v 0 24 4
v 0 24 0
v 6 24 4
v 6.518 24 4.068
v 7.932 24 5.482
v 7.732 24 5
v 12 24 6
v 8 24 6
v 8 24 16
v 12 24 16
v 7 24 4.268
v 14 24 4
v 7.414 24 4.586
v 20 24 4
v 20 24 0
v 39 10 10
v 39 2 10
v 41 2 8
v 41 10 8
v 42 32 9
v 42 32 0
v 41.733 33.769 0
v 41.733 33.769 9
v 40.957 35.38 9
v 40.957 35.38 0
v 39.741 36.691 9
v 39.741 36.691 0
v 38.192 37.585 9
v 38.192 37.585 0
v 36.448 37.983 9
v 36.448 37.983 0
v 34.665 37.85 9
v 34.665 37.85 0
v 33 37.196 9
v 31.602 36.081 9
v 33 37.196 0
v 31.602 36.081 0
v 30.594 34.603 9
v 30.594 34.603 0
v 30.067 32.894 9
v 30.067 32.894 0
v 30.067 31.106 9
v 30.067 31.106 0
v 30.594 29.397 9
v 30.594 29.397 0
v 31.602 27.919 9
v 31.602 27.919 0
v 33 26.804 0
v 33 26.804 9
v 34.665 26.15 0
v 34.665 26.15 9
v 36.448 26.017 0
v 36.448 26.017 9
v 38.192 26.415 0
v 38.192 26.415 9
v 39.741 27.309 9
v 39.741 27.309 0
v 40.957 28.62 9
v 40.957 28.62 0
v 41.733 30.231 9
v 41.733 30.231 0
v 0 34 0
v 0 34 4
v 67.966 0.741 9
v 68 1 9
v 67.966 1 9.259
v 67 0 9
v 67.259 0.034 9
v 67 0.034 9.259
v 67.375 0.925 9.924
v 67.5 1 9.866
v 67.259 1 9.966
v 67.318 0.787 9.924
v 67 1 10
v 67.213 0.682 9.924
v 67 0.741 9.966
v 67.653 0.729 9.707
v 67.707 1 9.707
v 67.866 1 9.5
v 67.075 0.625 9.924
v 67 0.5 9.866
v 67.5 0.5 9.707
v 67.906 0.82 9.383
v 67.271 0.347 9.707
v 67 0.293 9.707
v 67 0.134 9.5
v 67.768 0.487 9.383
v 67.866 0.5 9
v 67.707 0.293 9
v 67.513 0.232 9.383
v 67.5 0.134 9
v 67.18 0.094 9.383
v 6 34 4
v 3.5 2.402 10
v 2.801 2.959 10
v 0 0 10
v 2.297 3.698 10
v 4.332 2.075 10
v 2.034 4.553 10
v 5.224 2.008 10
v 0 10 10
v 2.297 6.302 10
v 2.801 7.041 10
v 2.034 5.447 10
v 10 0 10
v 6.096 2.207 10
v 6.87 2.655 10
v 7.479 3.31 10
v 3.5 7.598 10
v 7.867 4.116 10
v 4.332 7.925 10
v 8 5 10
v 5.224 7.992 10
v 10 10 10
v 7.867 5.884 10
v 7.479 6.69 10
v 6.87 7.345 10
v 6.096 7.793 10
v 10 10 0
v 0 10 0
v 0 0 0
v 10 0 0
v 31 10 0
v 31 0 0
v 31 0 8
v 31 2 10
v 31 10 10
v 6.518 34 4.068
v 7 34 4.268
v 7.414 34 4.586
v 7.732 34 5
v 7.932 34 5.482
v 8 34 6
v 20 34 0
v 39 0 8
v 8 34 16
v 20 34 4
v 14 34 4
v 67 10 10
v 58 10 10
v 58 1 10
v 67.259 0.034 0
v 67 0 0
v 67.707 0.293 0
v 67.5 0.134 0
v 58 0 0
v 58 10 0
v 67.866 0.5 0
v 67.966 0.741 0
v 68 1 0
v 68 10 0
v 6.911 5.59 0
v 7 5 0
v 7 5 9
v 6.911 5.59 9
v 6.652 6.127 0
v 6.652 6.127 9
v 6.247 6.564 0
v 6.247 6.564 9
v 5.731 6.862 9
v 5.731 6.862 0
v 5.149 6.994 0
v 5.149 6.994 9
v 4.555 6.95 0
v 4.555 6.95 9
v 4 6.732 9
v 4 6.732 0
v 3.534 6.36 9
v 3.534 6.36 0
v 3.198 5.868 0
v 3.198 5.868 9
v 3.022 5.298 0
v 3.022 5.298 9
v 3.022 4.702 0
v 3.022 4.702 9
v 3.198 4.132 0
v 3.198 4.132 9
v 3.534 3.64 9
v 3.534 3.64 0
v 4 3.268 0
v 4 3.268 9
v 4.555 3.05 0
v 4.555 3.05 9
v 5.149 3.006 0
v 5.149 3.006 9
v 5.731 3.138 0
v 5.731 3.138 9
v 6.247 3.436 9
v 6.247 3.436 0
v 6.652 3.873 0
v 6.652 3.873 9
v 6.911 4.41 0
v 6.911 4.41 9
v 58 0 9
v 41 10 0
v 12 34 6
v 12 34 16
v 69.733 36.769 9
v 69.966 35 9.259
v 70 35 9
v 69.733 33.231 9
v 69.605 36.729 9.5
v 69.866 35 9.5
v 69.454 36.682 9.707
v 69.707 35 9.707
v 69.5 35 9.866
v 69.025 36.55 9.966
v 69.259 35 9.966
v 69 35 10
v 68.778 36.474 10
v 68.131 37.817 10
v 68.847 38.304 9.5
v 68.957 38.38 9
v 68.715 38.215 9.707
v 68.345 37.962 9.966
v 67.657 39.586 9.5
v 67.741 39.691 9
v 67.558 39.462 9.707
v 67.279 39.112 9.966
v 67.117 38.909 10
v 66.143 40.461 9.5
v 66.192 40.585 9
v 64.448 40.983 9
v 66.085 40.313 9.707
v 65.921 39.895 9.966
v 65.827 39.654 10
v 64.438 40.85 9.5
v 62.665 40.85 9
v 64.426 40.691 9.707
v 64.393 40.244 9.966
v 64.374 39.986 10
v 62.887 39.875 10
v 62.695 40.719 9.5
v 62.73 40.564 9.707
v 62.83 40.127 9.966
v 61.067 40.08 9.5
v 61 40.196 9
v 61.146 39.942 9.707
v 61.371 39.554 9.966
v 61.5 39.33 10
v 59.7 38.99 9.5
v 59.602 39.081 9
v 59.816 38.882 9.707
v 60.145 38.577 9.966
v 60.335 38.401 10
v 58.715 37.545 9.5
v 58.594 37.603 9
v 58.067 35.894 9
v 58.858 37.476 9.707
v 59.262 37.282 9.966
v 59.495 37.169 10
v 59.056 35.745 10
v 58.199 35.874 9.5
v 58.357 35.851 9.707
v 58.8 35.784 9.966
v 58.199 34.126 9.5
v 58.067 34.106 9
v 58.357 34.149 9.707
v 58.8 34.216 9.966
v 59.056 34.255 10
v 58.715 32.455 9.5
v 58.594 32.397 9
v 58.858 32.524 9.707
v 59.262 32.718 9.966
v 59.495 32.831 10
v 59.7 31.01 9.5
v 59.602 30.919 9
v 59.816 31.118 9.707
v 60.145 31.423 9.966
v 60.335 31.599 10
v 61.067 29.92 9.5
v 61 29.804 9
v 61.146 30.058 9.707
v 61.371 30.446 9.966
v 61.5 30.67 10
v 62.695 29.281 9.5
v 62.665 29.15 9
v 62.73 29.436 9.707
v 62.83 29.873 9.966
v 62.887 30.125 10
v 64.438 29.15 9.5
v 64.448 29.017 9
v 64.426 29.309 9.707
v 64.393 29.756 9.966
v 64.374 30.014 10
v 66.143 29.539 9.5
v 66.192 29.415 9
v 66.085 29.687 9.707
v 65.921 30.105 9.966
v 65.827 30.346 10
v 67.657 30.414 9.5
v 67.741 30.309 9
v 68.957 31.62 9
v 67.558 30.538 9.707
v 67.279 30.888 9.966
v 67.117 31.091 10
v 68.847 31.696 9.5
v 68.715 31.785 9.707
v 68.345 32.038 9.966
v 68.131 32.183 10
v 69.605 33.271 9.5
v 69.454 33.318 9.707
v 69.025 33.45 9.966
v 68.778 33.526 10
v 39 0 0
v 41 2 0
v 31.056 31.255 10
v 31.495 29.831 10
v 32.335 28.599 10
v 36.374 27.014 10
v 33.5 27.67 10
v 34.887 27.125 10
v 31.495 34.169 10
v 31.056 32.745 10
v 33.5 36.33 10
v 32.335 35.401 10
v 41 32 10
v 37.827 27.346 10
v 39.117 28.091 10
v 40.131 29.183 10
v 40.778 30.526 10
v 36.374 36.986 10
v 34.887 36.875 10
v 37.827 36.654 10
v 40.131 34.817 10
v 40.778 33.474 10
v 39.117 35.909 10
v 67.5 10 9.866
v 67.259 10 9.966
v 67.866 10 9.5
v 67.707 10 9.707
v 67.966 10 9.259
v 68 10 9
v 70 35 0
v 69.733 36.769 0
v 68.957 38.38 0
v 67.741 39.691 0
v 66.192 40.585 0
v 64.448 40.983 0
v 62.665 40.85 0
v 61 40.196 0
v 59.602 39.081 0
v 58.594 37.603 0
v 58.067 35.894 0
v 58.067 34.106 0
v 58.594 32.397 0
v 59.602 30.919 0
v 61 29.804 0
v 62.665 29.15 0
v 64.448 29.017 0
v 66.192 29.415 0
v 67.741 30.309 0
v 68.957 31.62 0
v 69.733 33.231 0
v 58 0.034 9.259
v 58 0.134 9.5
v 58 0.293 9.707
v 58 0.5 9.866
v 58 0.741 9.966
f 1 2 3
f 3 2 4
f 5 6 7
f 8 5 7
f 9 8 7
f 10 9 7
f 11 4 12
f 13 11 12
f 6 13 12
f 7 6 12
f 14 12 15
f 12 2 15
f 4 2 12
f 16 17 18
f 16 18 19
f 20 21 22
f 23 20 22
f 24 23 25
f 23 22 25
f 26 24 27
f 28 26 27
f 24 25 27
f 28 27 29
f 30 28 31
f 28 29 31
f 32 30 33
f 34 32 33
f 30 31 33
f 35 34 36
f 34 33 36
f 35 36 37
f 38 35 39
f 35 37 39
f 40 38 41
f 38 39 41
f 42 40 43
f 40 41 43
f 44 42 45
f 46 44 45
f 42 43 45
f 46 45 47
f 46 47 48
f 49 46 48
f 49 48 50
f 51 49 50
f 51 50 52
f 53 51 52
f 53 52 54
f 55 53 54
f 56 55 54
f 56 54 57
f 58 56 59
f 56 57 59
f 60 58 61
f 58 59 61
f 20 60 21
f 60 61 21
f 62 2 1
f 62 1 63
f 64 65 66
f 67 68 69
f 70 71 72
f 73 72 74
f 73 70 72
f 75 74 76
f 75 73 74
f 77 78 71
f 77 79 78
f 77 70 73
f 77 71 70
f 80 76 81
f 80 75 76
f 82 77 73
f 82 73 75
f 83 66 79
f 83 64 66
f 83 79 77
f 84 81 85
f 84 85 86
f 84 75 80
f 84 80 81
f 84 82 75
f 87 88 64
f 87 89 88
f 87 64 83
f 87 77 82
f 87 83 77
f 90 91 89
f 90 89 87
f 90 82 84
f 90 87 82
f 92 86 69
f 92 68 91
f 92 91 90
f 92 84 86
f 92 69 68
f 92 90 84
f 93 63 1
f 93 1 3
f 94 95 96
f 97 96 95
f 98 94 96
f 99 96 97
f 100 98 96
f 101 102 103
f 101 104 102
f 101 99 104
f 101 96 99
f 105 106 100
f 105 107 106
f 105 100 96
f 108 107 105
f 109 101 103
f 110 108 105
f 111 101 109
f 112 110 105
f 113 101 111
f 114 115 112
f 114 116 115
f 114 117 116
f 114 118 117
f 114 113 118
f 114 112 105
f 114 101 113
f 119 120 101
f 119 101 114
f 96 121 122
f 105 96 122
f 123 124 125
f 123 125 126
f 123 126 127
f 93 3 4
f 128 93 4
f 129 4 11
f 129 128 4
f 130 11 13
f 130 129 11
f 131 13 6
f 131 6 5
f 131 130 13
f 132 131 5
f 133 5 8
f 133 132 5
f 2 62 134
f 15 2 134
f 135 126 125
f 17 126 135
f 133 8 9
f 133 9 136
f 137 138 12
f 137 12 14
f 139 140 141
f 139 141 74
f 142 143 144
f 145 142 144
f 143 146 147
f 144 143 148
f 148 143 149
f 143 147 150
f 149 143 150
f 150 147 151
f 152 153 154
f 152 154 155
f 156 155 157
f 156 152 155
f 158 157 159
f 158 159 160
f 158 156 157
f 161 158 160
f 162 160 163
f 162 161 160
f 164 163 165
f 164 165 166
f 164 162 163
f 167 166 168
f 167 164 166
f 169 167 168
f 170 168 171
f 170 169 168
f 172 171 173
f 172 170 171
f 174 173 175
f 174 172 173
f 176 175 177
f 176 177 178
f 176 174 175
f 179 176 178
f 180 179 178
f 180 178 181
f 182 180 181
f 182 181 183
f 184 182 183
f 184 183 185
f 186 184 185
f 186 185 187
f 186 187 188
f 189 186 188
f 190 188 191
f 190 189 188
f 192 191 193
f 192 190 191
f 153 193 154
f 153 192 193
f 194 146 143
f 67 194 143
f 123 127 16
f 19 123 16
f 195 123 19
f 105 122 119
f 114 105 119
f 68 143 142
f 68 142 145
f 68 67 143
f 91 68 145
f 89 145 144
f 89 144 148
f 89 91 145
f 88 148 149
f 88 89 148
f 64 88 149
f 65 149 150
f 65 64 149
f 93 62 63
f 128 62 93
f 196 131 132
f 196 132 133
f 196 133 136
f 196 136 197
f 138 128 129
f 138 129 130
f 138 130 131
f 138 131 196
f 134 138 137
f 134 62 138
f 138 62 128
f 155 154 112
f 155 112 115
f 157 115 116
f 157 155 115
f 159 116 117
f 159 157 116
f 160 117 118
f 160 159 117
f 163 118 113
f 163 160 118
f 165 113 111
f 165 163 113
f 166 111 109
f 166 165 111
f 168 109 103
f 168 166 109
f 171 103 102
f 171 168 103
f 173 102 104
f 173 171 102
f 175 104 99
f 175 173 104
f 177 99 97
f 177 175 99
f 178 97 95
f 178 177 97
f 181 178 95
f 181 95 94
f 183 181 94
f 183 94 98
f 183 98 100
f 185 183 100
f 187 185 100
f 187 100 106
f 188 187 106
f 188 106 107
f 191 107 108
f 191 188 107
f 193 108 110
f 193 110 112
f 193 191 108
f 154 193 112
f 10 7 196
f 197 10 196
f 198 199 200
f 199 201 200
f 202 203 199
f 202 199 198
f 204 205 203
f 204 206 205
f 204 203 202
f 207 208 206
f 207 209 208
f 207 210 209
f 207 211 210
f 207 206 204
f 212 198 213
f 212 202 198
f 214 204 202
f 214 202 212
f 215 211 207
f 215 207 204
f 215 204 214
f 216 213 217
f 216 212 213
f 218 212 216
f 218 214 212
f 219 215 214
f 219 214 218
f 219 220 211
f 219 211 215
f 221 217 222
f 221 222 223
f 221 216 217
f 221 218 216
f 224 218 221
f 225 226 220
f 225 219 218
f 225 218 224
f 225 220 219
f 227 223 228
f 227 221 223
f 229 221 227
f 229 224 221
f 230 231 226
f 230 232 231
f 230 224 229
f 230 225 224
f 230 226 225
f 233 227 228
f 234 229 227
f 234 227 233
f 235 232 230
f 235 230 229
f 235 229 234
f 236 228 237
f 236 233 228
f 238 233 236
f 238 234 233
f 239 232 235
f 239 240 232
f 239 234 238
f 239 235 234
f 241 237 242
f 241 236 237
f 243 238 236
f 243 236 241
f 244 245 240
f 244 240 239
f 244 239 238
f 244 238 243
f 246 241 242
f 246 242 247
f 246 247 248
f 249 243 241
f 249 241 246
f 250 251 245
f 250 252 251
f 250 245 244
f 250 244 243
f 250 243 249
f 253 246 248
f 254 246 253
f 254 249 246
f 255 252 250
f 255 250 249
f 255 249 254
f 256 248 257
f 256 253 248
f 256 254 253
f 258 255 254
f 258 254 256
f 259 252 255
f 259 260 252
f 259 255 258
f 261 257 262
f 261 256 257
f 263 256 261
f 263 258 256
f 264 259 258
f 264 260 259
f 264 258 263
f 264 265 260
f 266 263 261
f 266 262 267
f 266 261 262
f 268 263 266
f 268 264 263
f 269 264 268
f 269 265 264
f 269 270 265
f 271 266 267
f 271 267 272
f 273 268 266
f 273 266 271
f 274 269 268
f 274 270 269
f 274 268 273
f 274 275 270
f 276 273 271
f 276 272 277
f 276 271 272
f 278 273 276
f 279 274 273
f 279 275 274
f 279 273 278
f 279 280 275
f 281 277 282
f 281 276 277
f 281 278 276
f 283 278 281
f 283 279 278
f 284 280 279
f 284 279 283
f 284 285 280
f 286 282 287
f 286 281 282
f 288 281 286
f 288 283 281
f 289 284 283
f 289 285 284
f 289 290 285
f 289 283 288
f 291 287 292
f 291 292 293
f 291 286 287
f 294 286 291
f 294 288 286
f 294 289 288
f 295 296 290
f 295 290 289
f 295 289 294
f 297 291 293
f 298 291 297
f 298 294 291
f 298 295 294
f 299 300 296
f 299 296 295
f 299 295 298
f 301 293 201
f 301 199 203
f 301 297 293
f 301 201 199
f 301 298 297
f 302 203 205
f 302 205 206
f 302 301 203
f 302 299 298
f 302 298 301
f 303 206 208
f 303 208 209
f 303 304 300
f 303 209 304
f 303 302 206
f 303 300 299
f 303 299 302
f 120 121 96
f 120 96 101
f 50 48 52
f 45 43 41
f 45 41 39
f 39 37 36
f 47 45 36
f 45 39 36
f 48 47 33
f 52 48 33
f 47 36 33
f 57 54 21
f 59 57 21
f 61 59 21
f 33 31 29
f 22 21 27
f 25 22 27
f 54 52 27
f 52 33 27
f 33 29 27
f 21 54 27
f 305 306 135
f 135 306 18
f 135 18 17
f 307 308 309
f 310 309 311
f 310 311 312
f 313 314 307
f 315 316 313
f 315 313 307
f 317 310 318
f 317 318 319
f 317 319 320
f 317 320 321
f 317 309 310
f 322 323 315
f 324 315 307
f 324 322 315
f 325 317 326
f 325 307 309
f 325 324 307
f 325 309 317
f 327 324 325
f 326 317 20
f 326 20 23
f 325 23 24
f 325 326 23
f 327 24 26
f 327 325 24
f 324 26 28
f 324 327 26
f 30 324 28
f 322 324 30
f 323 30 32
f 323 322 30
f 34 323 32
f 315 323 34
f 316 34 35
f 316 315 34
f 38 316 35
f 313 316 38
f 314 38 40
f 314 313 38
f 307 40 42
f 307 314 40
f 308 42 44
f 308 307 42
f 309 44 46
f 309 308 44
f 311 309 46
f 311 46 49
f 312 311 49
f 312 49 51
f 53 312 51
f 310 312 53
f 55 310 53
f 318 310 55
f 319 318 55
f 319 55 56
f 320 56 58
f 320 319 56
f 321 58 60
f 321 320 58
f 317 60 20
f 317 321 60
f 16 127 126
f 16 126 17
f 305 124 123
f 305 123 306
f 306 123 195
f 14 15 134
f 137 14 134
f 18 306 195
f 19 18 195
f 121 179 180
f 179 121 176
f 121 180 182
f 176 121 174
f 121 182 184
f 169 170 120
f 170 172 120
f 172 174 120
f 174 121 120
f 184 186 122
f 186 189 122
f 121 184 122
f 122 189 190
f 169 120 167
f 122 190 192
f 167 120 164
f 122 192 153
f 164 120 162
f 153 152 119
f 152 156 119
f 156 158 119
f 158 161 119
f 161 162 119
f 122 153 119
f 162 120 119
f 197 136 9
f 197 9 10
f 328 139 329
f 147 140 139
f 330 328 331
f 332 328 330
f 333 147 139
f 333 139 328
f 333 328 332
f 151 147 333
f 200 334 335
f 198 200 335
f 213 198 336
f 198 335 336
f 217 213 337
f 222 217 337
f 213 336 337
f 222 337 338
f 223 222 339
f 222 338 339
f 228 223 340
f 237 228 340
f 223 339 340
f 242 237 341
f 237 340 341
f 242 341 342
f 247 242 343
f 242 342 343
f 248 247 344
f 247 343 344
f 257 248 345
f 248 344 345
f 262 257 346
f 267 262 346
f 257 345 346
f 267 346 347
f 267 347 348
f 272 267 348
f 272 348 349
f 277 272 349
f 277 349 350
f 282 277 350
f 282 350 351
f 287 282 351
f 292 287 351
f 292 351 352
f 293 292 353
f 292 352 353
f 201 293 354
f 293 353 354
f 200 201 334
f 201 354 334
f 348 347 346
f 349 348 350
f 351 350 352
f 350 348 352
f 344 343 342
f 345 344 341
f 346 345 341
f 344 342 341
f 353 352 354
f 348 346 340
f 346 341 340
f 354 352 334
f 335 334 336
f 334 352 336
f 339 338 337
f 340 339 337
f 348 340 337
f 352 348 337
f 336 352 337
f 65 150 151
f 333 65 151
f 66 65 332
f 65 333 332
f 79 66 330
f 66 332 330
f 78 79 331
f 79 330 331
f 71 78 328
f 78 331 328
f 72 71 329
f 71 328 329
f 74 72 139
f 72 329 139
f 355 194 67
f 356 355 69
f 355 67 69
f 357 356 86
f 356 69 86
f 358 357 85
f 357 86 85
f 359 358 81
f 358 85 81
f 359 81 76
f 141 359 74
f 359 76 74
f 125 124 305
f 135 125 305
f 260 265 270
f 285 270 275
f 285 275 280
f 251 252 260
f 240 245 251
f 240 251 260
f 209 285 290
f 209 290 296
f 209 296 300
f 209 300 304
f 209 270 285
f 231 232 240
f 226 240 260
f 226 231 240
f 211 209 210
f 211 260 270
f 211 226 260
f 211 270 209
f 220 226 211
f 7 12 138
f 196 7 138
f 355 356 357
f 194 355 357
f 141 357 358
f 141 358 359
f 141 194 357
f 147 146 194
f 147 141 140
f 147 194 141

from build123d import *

# Parameters (mm, degrees)
BOX_W             = 10
BOX_H             = 10
BOX_DEPTH         = 10
FILLET_R          = 1
BOX001_W          = 10
BOX001_H          = 10
BOX001_DEPTH      = 10
CHAMFER_SIZE      = 2
CYLINDER_R        = 2
CYLINDER_DEPTH    = 10
BOX002_W          = 10
BOX002_H          = 10
BOX002_DEPTH      = 10
CHAMFER001_SIZE   = 1
CYLINDER001_R     = 6
CYLINDER001_DEPTH = 10
FILLET001_R       = 1
CYLINDER002_R     = 6
CYLINDER002_DEPTH = 10
CHAMFER002_SIZE   = 1
BOX003_W          = 20
BOX003_H          = 10
BOX003_DEPTH      = 4
BOX004_W          = 4
BOX004_H          = 10
BOX004_DEPTH      = 16
FILLET002_R       = 2
CHAMFER003_SIZE   = 2


with BuildPart() as fillet_body:
    # Box → Box (new body)
    with BuildSketch(Plane(origin=(40, 0, 0), x_dir=(1, 0, 0), z_dir=(0, 0, 1))):
        with Locations((5, 5)):
            Rectangle(BOX_W, BOX_H)
    extrude(amount=BOX_DEPTH)

    # Fillet
    fillet_edges = [fillet_body.edges().sort_by_distance(p)[0] for p in [
        (50, 0, 5),
        (50, 5, 10),
        (45, 0, 10),
    ]]
    fillet(fillet_edges, radius=FILLET_R)


with BuildPart() as fillet_body_1:
    # Fillet placement: moved
    add(fillet_body.part.moved(Location((18, 0, 0))))


with BuildPart() as chamfer_body:
    # Box001 → Box001 (new body)
    with BuildSketch(Plane(origin=(31, 0, 0), x_dir=(1, 0, 0), z_dir=(0, 0, 1))):
        with Locations((5, 5)):
            Rectangle(BOX001_W, BOX001_H)
    extrude(amount=BOX001_DEPTH)

    # Chamfer
    chamfer_edges = [chamfer_body.edges().sort_by_distance(p)[0] for p in [
        (41, 0, 5),
        (41, 5, 10),
        (36, 0, 10),
    ]]
    chamfer(chamfer_edges, length=CHAMFER_SIZE)


with BuildPart() as cilindre:
    # Cylinder → Cylinder (new body)
    with BuildSketch(Plane(origin=(5, 5, 0), x_dir=(1, 0, 0), z_dir=(0, 0, 1))):
        Circle(CYLINDER_R)
    extrude(amount=CYLINDER_DEPTH)


with BuildPart() as chamfer001:
    # Box002 → Box002 (new body)
    with BuildSketch(Plane.XY):
        with Locations((5, 5)):
            Rectangle(BOX002_W, BOX002_H)
    extrude(amount=BOX002_DEPTH)

    # Cut: cut Cilindre
    add(cilindre.part, mode=Mode.SUBTRACT)

    # Chamfer001
    chamfer001_edges = [chamfer001.edges().sort_by_distance(p)[0] for p in [
        (3, 5, 10),
    ]]
    chamfer(chamfer001_edges, length=CHAMFER001_SIZE)


with BuildPart() as fillet001:
    # Cylinder001 → Cylinder001 (new body)
    with BuildSketch(Plane(origin=(64, 35, 0), x_dir=(1, 0, 0), z_dir=(0, 0, 1))):
        Circle(CYLINDER001_R)
    extrude(amount=CYLINDER001_DEPTH)

    # Fillet001
    fillet001_edges = [fillet001.edges().sort_by_distance(p)[0] for p in [
        (58, 35, 10),
    ]]
    fillet(fillet001_edges, radius=FILLET001_R)


with BuildPart() as chamfer002:
    # Cylinder002 → Cylinder002 (new body)
    with BuildSketch(Plane(origin=(36, 32, 0), x_dir=(1, 0, 0), z_dir=(0, 0, 1))):
        Circle(CYLINDER002_R)
    extrude(amount=CYLINDER002_DEPTH)

    # Chamfer002
    chamfer002_edges = [chamfer002.edges().sort_by_distance(p)[0] for p in [
        (30, 32, 10),
    ]]
    chamfer(chamfer002_edges, length=CHAMFER002_SIZE)


with BuildPart() as cub003:
    # Box003 → Box003 (new body)
    with BuildSketch(Plane(origin=(0, 24, 0), x_dir=(1, 0, 0), z_dir=(0, 0, 1))):
        with Locations((10, 5)):
            Rectangle(BOX003_W, BOX003_H)
    extrude(amount=BOX003_DEPTH)


with BuildPart() as chamfer003:
    # Box004 → Box004 (new body)
    with BuildSketch(Plane(origin=(8, 24, 0), x_dir=(1, 0, 0), z_dir=(0, 0, 1))):
        with Locations((2, 5)):
            Rectangle(BOX004_W, BOX004_H)
    extrude(amount=BOX004_DEPTH)

    # Fusion: union Cub003
    add(cub003.part)

    # Fillet002
    fillet002_edges = [chamfer003.edges().sort_by_distance(p)[0] for p in [
        (8, 29, 4),
    ]]
    fillet(fillet002_edges, radius=FILLET002_R)

    # Chamfer003
    chamfer003_edges = [chamfer003.edges().sort_by_distance(p)[0] for p in [
        (12, 29, 4),
    ]]
    chamfer(chamfer003_edges, length=CHAMFER003_SIZE)


solid = Compound([fillet_body_1.part, chamfer_body.part, chamfer001.part, fillet001.part, chamfer002.part, chamfer003.part])
